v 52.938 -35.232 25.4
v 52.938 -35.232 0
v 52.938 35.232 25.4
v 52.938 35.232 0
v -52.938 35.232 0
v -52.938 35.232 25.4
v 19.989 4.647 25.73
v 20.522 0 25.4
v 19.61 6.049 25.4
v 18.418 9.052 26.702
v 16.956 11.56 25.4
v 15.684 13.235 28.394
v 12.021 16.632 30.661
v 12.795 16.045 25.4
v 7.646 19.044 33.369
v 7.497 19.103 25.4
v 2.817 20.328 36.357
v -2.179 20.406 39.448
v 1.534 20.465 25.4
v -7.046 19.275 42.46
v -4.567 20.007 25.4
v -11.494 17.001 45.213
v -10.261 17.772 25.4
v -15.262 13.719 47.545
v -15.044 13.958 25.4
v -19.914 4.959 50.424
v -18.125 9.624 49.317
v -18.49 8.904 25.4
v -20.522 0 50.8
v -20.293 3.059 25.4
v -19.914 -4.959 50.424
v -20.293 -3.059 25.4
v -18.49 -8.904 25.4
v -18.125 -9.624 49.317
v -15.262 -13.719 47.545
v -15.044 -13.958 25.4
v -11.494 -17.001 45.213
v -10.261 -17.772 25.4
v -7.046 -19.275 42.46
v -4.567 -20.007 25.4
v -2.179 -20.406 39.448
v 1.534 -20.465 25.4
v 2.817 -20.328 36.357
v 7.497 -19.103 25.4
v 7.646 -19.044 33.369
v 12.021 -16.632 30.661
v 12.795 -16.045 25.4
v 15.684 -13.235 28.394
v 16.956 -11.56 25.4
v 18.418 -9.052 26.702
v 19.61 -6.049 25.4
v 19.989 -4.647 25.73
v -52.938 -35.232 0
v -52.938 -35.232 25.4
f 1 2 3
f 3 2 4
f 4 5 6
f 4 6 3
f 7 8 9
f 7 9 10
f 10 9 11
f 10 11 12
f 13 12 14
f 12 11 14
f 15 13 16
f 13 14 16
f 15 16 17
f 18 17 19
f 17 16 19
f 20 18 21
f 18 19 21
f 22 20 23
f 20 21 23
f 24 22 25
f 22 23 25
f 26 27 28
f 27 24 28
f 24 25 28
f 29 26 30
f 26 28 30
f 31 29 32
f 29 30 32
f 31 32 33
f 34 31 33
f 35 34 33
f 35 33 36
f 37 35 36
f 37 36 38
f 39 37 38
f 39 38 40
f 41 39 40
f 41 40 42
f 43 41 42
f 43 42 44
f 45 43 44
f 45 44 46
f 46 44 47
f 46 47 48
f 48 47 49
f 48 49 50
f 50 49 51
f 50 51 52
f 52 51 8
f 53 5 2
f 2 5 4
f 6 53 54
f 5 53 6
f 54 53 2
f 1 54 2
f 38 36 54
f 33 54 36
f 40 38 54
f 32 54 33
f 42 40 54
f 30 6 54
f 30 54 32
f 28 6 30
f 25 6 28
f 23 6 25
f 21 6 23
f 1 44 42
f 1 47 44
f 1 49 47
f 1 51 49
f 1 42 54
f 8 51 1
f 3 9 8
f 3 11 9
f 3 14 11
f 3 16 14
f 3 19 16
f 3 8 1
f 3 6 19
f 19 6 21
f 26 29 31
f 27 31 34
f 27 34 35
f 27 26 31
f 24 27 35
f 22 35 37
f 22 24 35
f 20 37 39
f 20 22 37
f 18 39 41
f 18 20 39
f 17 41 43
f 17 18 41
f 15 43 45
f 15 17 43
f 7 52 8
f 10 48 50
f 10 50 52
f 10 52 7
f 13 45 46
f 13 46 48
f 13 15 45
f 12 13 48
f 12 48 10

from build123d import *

# Parameters (mm, degrees)
F0_W          = 105.8753505349
F0_H          = 70.4643428326
F1_DEPTH      = 25.4
F2_R          = 20.5218866045
F3_DEPTH      = 25.4
F5_DEPTH      = 35.2331714163
F5_DEPTH_BACK = 35.2331714163


with BuildPart() as f1:
    # F0 (on Top) → F1 (new body)
    with BuildSketch(Plane.XY):
        Rectangle(F0_W, F0_H)
    extrude(amount=F1_DEPTH)

    # F2 (on face) → F3 (join)
    with BuildSketch(Plane.XY.offset(25.4)):
        Circle(F2_R)
    extrude(amount=F3_DEPTH)

    # F4 (on Front) → F5 (cut, two sides)
    with BuildSketch(Plane.XZ) as f5_sk:
        Polygon((20.5218866045, 50.8), (-20.5218866045, 50.8), (20.5218866045, 25.4), align=None)
    extrude(amount=-F5_DEPTH, mode=Mode.SUBTRACT)
    extrude(f5_sk.sketch, amount=F5_DEPTH_BACK, mode=Mode.SUBTRACT)


solid = f1.part
